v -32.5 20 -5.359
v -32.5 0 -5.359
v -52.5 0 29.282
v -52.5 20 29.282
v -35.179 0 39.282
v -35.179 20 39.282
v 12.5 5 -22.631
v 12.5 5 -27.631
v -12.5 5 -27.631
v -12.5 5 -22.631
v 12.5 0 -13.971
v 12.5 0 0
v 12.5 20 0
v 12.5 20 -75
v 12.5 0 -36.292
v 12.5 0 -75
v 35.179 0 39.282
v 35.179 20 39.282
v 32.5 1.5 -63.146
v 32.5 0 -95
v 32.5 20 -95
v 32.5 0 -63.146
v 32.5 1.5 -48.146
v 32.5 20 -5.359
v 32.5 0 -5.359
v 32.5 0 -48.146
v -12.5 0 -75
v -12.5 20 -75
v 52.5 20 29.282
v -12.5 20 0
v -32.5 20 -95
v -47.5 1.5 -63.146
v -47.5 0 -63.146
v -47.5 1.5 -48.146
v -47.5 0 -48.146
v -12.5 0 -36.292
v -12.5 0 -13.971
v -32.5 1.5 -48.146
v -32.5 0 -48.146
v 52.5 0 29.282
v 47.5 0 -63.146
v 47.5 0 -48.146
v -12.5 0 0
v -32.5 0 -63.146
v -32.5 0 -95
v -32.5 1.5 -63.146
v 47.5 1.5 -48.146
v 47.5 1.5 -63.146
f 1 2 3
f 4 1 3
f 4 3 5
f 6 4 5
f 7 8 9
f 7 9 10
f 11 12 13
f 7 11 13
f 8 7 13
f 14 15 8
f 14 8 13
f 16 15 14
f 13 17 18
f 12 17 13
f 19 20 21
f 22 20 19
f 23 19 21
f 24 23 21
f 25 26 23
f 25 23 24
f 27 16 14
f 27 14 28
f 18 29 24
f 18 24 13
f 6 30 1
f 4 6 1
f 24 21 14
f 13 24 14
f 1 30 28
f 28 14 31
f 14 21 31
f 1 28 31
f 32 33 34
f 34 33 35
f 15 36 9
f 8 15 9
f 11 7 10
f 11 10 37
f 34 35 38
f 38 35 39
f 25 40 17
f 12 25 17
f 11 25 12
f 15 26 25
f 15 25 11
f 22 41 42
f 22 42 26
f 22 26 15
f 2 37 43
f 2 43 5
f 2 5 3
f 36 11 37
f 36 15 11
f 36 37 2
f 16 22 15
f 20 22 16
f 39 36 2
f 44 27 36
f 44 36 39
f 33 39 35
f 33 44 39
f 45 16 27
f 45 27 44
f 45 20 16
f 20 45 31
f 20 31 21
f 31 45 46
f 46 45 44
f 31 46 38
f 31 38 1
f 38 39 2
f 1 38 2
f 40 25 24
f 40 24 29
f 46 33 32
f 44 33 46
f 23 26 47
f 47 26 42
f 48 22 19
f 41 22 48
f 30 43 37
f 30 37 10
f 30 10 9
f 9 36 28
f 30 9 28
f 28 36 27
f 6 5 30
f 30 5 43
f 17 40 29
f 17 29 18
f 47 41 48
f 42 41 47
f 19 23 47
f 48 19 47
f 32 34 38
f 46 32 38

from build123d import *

# Parameters (mm, degrees)
BOSS_EXTRUDE1_DEPTH = 20
BOSS_EXTRUDE2_DEPTH = 25
SKETCH6_W           = 15
SKETCH6_H           = 15
BOSS_EXTRUDE3_DEPTH = 1.5


with BuildPart() as part:
    # Sketch2 → Boss-Extrude1 (new body)
    with BuildSketch(Plane(origin=(0, 0, 0), x_dir=(1, 0, 0), z_dir=(0, 1, 0))):
        Polygon((-35.179491924, -39.282032303), (-12.5, 0), (-12.5, 75), (0, 75), (0, 95), (-32.5, 95), (-32.5, 5.358983849), (-52.5, -29.282032303), align=None)
    boss_extrude1 = extrude(amount=BOSS_EXTRUDE1_DEPTH)

    # Mirror3: Boss-Extrude1 across plane
    add(boss_extrude1.mirror(Plane(origin=(0, 0, 0), x_dir=(0, 0, 1), z_dir=(1, 0, 0))))

    # Sketch4 → Boss-Extrude2 (add)
    with BuildSketch(Plane.ZY.offset(-12.5)):
        Polygon((-36.291651246, 0), (-27.631397208, 5), (-22.631397208, 5), (-13.97114317, 0), align=None)
    extrude(amount=BOSS_EXTRUDE2_DEPTH)

    # Sketch6 → Boss-Extrude3 (add)
    with BuildSketch(Plane.XZ):
        with Locations((-40, -55.645825623)):
            Rectangle(SKETCH6_W, SKETCH6_H)
        with Locations((40, -55.645825623)):
            Rectangle(SKETCH6_W, SKETCH6_H)
    extrude(amount=-BOSS_EXTRUDE3_DEPTH)


solid = part.part
